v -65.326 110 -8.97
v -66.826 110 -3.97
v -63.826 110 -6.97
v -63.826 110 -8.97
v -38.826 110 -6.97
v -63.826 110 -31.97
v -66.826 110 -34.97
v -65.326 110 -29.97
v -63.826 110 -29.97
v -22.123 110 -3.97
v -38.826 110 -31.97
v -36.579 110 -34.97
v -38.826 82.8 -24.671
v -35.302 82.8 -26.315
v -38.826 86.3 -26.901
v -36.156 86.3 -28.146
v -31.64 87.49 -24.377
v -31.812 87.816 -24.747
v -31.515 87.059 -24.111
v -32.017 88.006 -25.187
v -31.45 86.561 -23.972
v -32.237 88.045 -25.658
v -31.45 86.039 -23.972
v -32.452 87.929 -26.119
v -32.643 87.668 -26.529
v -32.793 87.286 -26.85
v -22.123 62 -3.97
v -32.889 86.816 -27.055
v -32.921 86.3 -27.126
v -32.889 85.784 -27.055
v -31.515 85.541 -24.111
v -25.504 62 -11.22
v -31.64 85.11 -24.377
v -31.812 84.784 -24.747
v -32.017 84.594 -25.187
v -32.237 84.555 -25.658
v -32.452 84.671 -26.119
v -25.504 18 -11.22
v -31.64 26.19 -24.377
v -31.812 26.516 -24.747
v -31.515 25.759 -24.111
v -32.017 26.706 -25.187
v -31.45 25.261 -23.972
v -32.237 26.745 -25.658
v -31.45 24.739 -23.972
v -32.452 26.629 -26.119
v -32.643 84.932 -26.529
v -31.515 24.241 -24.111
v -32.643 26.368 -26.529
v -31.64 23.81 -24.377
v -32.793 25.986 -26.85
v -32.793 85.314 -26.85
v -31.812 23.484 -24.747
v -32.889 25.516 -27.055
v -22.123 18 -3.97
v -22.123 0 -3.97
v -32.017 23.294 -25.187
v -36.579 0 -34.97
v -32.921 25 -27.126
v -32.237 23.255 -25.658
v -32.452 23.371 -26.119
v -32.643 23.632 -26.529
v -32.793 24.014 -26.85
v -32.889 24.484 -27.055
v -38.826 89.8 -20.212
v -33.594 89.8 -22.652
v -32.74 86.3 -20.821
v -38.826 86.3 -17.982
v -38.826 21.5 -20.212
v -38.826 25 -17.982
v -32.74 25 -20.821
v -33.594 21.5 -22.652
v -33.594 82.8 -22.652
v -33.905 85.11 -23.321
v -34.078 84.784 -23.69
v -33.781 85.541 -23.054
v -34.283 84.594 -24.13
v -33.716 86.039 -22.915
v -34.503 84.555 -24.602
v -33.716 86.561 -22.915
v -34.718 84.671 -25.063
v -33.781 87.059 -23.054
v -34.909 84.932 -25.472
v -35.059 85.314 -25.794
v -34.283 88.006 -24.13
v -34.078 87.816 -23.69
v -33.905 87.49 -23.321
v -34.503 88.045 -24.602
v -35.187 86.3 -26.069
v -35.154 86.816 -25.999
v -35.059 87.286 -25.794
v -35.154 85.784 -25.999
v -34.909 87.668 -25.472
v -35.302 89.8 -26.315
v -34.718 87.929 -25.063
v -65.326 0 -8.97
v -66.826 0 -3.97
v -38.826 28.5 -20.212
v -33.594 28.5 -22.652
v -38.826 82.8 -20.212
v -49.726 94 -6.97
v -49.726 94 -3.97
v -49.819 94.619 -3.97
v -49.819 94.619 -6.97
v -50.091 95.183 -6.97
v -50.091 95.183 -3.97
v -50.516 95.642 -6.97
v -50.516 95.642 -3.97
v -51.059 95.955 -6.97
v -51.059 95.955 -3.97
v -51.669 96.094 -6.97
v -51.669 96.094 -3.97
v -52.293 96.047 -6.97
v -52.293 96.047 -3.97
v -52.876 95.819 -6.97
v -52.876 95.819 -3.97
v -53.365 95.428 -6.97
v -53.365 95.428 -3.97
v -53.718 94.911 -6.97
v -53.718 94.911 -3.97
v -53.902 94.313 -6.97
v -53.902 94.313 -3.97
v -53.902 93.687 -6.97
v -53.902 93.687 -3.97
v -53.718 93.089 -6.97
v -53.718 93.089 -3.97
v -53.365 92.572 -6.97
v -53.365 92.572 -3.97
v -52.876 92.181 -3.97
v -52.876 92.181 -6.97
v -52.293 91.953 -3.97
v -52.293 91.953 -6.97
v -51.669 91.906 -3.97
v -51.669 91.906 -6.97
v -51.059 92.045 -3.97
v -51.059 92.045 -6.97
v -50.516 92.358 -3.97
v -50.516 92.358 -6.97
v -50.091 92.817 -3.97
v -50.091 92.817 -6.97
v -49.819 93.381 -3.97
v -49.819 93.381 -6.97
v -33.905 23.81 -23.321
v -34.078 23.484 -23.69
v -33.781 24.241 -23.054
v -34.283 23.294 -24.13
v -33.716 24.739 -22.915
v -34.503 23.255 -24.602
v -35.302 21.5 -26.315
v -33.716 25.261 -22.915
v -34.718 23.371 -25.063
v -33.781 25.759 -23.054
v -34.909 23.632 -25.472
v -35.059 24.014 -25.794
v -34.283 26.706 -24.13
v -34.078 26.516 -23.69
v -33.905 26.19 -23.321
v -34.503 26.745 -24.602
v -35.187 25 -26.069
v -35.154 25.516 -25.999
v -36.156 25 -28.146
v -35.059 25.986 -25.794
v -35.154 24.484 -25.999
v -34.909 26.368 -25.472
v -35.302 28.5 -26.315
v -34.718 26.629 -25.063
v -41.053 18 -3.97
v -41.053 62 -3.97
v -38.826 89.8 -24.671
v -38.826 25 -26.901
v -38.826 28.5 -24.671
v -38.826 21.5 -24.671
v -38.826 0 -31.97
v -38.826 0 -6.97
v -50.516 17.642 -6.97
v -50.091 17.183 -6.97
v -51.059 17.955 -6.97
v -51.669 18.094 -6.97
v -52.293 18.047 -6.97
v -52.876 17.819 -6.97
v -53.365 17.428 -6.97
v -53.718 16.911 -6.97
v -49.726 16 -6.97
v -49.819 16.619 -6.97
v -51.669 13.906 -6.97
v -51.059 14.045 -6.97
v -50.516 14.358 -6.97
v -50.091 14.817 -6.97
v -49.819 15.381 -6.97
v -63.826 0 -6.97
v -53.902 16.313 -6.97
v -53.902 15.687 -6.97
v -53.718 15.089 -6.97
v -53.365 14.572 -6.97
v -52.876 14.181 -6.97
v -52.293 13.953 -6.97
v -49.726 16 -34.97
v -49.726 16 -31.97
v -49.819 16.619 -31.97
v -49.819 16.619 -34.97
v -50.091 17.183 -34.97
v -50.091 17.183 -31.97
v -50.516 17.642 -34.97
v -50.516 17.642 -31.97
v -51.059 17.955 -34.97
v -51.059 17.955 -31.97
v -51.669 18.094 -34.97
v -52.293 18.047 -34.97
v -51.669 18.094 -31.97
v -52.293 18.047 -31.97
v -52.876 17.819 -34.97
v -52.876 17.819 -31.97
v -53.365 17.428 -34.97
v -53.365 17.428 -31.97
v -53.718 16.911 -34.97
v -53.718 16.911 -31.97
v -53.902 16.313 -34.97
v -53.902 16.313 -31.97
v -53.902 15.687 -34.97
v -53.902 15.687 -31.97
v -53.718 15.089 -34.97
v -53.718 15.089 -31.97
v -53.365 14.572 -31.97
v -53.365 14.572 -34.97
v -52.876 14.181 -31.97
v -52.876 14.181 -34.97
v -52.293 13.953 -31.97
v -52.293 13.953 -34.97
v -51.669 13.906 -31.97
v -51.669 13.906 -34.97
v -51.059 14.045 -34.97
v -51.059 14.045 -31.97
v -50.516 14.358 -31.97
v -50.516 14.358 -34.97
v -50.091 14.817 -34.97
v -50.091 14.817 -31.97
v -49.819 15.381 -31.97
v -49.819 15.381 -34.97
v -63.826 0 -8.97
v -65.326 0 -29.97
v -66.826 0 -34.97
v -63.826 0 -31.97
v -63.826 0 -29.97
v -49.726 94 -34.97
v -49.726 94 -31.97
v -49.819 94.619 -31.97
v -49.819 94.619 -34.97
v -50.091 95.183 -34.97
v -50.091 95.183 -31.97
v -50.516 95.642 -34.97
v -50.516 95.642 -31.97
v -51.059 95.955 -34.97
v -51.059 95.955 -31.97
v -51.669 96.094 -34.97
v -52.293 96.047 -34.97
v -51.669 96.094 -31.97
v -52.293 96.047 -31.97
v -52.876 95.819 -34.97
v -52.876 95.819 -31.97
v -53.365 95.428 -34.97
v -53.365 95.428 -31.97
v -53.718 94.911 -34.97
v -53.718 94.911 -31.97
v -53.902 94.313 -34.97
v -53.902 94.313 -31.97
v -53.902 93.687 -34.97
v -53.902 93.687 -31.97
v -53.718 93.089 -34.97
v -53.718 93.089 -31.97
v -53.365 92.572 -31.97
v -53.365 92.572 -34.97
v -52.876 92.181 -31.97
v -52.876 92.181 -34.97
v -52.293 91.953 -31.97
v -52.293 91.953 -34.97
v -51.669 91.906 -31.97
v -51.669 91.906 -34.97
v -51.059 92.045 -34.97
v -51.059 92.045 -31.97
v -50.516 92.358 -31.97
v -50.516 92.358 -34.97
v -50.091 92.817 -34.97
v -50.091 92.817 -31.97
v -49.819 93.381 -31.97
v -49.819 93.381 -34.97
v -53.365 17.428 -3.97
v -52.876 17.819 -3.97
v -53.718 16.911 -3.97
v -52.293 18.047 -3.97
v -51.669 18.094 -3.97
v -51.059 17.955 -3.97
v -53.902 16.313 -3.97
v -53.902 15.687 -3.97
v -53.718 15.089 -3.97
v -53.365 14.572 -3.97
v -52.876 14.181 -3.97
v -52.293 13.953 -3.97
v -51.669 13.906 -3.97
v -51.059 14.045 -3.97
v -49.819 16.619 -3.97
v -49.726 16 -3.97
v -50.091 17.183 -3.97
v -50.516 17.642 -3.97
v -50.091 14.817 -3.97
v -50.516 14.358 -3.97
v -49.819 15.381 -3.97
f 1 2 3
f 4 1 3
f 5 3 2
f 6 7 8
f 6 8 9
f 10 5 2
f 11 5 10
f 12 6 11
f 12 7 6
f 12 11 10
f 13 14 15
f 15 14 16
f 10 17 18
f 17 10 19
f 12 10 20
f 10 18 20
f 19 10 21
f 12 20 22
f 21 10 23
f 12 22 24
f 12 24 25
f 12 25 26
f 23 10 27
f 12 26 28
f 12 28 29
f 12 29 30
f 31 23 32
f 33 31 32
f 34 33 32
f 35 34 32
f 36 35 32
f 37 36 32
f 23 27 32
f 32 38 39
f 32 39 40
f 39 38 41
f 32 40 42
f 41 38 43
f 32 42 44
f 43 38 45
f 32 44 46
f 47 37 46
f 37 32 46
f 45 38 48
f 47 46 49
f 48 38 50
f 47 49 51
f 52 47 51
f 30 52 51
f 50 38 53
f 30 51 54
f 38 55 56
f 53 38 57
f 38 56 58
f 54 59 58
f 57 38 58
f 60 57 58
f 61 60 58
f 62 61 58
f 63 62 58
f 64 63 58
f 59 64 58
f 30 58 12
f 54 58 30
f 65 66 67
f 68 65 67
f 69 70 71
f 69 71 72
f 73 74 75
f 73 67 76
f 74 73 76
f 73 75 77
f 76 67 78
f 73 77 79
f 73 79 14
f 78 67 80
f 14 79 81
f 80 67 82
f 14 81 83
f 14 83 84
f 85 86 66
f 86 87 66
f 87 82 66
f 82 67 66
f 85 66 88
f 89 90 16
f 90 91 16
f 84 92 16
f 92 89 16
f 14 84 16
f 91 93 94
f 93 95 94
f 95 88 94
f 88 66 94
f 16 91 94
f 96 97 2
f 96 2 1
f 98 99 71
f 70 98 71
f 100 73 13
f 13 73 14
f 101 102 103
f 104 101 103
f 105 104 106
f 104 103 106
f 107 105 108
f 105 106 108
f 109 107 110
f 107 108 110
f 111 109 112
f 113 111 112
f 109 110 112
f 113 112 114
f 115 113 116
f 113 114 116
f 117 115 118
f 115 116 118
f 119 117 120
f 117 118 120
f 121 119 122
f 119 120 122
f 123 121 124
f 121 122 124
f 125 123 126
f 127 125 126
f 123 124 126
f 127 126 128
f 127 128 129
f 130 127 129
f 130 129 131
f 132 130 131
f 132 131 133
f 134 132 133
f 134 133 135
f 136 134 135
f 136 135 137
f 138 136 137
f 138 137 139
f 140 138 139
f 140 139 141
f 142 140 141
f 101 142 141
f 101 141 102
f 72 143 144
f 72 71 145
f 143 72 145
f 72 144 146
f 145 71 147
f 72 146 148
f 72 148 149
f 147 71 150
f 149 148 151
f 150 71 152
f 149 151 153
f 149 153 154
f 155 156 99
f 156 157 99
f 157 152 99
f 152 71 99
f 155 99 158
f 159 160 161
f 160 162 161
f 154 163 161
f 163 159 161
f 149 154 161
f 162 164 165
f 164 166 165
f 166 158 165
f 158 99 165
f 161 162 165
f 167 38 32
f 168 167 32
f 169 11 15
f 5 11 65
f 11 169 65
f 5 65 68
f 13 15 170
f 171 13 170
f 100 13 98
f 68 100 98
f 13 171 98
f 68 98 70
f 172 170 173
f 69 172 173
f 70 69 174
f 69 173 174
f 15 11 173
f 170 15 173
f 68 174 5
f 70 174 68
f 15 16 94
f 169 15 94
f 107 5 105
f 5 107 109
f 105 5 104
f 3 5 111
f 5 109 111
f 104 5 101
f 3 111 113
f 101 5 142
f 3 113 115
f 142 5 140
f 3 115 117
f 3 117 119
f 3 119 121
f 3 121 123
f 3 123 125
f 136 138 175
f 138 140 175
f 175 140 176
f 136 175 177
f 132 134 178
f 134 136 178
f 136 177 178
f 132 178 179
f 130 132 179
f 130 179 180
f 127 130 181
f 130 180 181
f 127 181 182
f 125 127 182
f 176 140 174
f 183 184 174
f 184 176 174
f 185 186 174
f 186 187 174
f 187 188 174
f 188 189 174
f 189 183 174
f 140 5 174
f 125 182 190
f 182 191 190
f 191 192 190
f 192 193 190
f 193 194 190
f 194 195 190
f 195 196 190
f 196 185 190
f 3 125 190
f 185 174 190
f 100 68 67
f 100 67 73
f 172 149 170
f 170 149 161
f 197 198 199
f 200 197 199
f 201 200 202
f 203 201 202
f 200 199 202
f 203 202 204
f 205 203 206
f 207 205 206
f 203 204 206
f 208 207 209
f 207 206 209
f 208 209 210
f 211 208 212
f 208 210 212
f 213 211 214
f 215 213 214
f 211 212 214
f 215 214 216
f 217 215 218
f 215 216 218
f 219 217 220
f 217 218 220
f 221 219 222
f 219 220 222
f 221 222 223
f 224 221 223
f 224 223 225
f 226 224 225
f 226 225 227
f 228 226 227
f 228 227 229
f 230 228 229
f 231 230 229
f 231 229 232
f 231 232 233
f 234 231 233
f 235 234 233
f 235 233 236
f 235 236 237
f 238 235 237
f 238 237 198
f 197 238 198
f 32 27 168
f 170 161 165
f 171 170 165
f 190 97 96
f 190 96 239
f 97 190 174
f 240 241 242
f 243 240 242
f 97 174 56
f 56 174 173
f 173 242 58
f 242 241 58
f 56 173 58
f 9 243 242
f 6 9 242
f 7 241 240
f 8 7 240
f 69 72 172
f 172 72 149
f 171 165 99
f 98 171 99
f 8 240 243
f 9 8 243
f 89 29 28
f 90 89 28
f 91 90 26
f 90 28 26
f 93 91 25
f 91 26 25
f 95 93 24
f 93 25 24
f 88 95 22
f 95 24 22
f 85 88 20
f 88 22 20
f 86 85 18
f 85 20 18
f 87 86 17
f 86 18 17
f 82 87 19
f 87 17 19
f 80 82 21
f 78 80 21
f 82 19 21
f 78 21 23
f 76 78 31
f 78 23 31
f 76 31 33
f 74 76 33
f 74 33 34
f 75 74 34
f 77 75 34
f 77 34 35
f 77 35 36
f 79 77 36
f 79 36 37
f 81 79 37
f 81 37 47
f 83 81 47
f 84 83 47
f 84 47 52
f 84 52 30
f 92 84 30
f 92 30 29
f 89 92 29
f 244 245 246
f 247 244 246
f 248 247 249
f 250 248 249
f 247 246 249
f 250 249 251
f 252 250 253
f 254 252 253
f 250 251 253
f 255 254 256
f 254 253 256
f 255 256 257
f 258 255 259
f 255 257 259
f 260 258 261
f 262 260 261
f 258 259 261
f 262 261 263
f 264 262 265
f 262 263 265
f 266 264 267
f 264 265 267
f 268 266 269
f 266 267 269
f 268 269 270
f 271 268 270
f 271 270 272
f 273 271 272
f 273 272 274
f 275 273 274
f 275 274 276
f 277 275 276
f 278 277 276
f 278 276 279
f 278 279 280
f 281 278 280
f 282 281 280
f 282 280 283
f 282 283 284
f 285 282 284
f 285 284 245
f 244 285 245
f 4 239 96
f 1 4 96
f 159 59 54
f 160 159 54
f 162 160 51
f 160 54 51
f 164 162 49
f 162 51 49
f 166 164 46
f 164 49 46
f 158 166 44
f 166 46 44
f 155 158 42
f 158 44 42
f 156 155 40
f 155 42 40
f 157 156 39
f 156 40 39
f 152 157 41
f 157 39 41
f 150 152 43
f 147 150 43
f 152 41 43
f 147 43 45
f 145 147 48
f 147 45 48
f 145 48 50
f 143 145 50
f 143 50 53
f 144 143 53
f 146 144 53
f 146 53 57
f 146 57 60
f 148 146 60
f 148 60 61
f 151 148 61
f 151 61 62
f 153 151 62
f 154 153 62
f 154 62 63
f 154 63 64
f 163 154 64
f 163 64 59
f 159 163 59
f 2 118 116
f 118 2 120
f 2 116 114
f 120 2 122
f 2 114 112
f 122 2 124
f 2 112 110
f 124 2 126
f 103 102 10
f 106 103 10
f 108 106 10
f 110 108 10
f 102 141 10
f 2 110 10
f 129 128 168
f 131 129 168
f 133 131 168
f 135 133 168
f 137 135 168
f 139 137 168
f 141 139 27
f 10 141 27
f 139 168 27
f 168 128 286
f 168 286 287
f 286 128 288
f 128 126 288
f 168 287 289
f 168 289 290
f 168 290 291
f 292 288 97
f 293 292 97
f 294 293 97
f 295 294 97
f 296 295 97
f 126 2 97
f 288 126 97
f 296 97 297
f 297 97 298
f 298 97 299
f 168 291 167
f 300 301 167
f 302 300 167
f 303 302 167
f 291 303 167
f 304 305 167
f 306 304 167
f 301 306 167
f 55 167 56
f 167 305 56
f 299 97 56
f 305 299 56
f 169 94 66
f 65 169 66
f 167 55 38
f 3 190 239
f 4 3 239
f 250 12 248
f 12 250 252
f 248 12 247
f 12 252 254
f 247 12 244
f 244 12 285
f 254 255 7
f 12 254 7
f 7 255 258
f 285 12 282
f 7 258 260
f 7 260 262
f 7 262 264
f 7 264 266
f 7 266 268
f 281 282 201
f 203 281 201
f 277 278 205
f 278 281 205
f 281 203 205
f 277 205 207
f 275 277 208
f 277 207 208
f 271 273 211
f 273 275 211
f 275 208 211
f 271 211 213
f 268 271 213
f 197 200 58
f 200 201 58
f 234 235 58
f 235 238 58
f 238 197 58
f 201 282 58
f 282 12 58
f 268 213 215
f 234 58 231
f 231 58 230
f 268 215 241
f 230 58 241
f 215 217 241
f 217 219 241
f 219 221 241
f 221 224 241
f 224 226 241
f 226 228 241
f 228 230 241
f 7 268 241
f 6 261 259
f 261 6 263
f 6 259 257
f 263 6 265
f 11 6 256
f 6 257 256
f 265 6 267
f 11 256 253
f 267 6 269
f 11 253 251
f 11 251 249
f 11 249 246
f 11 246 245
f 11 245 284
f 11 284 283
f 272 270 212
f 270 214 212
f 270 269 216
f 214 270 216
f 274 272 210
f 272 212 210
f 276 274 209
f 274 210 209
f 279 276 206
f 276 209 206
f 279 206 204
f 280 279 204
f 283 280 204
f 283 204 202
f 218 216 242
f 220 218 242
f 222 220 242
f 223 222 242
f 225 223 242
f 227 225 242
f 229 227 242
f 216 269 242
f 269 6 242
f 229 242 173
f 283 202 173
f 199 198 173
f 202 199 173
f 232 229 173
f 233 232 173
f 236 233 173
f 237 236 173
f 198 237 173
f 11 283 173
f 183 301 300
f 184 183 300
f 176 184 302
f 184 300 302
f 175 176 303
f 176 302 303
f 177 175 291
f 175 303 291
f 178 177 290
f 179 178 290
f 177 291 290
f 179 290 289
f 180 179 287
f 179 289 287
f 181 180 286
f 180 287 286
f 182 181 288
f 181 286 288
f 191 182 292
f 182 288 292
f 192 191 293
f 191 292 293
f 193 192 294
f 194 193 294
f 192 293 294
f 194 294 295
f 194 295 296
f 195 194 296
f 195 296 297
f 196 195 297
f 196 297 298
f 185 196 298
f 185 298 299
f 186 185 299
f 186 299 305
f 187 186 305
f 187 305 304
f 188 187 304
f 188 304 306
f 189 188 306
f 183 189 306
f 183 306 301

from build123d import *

# Parameters (mm, degrees)
EXTRUDE_1_DEPTH      = 110
SKETCH_2_W           = 8
SKETCH_2_H           = 44
CUT_EXTRUDE_3_DEPTH  = 110
CUT_EXTRUDE_4_DEPTH  = 134.373777696
SKETCH_4_R           = 1.75
CUT_EXTRUDE_6_DEPTH  = 10
CUT_EXTRUDE_START    = -2.5
CUT_EXTRUDE_11_DEPTH = 10
SKETCH_6_R           = 2.1
CUT_EXTRUDE_13_DEPTH = 133.388375153


with BuildPart() as part:
    # Эскиз1 → Бобышка-Вытянуть1 (new body)
    with BuildSketch(Plane(origin=(0, 0, 0), x_dir=(1, 0, 0), z_dir=(0, 1, 0))):
        Polygon((-66.825757576, 34.969739794), (-66.825757576, 29.969739794), (-63.825757576, 29.969739794), (-63.825757576, 31.969739794), (-38.825757576, 31.969739794), (-38.825757576, 6.969739794), (-63.825757576, 6.969739794), (-63.825757576, 8.969739794), (-66.825757576, 8.969739794), (-66.825757576, 3.969739794), (-22.123470102, 3.969739794), (-36.579007505, 34.969739794), align=None)
    extrude(amount=EXTRUDE_1_DEPTH)

    # Эскиз2 → Вырез-Вытянуть3 (cut)
    with BuildSketch(Plane(origin=(-16.651582729, 0, 7.764760547), x_dir=(-0.42261826174069383, 0, -0.9063077870366526), z_dir=(0.9063077870366527, 0, -0.4226182617406939))):
        with Locations((16.947588566, 40)):
            Rectangle(SKETCH_2_W, SKETCH_2_H)
    extrude(amount=-CUT_EXTRUDE_3_DEPTH, mode=Mode.SUBTRACT)

    # Эскиз3 → Вырез-Вытянуть4 (cut, through all)
    with BuildSketch(Plane.XZ):
        Polygon((-66.825757576, -3.969739794), (-65.325757576, -8.969739794), (-66.825757576, -8.969739794), align=None)
        Polygon((-66.825757576, -29.969739794), (-66.825757576, -34.969739794), (-65.325757576, -29.969739794), align=None)
    extrude(amount=-CUT_EXTRUDE_4_DEPTH, mode=Mode.SUBTRACT)

    # Эскиз4 → Вырез-Вытянуть6 (cut)
    with BuildSketch(Plane(origin=(-16.651582729, 0, 7.764760547), x_dir=(-0.42261826174069383, 0, -0.9063077870366526), z_dir=(0.9063077870366527, 0, -0.4226182617406939))):
        with Locations((36.747588566, 86.3)):
            Circle(SKETCH_4_R)
        with Locations((36.747588566, 25)):
            Circle(SKETCH_4_R)
    extrude(amount=-CUT_EXTRUDE_6_DEPTH, mode=Mode.SUBTRACT)

    # Эскиз5 → Вырез-Вытянуть11 (cut)
    with BuildSketch(Plane(origin=(-16.651582729, 0, 7.764760547), x_dir=(-0.42261826174069383, 0, -0.9063077870366526), z_dir=(0.9063077870366527, 0, -0.4226182617406939)).offset(CUT_EXTRUDE_START)):
        Polygon((40.78904045, 86.3), (38.768314508, 89.8), (34.726862624, 89.8), (32.706136682, 86.3), (34.726862624, 82.8), (38.768314508, 82.8), align=None)
        Polygon((40.78904045, 25), (38.768314508, 28.5), (34.726862624, 28.5), (32.706136682, 25), (34.726862624, 21.5), (38.768314508, 21.5), align=None)
    extrude(amount=-CUT_EXTRUDE_11_DEPTH, mode=Mode.SUBTRACT)

    # Эскиз6 → Вырез-Вытянуть13 (cut, through all)
    with BuildSketch(Plane.XY.offset(-3.969739794)):
        with Locations((-51.825757576, 94)):
            Circle(SKETCH_6_R)
        with Locations((-51.825757576, 16)):
            Circle(SKETCH_6_R)
    extrude(amount=-CUT_EXTRUDE_13_DEPTH, mode=Mode.SUBTRACT)


solid = part.part
